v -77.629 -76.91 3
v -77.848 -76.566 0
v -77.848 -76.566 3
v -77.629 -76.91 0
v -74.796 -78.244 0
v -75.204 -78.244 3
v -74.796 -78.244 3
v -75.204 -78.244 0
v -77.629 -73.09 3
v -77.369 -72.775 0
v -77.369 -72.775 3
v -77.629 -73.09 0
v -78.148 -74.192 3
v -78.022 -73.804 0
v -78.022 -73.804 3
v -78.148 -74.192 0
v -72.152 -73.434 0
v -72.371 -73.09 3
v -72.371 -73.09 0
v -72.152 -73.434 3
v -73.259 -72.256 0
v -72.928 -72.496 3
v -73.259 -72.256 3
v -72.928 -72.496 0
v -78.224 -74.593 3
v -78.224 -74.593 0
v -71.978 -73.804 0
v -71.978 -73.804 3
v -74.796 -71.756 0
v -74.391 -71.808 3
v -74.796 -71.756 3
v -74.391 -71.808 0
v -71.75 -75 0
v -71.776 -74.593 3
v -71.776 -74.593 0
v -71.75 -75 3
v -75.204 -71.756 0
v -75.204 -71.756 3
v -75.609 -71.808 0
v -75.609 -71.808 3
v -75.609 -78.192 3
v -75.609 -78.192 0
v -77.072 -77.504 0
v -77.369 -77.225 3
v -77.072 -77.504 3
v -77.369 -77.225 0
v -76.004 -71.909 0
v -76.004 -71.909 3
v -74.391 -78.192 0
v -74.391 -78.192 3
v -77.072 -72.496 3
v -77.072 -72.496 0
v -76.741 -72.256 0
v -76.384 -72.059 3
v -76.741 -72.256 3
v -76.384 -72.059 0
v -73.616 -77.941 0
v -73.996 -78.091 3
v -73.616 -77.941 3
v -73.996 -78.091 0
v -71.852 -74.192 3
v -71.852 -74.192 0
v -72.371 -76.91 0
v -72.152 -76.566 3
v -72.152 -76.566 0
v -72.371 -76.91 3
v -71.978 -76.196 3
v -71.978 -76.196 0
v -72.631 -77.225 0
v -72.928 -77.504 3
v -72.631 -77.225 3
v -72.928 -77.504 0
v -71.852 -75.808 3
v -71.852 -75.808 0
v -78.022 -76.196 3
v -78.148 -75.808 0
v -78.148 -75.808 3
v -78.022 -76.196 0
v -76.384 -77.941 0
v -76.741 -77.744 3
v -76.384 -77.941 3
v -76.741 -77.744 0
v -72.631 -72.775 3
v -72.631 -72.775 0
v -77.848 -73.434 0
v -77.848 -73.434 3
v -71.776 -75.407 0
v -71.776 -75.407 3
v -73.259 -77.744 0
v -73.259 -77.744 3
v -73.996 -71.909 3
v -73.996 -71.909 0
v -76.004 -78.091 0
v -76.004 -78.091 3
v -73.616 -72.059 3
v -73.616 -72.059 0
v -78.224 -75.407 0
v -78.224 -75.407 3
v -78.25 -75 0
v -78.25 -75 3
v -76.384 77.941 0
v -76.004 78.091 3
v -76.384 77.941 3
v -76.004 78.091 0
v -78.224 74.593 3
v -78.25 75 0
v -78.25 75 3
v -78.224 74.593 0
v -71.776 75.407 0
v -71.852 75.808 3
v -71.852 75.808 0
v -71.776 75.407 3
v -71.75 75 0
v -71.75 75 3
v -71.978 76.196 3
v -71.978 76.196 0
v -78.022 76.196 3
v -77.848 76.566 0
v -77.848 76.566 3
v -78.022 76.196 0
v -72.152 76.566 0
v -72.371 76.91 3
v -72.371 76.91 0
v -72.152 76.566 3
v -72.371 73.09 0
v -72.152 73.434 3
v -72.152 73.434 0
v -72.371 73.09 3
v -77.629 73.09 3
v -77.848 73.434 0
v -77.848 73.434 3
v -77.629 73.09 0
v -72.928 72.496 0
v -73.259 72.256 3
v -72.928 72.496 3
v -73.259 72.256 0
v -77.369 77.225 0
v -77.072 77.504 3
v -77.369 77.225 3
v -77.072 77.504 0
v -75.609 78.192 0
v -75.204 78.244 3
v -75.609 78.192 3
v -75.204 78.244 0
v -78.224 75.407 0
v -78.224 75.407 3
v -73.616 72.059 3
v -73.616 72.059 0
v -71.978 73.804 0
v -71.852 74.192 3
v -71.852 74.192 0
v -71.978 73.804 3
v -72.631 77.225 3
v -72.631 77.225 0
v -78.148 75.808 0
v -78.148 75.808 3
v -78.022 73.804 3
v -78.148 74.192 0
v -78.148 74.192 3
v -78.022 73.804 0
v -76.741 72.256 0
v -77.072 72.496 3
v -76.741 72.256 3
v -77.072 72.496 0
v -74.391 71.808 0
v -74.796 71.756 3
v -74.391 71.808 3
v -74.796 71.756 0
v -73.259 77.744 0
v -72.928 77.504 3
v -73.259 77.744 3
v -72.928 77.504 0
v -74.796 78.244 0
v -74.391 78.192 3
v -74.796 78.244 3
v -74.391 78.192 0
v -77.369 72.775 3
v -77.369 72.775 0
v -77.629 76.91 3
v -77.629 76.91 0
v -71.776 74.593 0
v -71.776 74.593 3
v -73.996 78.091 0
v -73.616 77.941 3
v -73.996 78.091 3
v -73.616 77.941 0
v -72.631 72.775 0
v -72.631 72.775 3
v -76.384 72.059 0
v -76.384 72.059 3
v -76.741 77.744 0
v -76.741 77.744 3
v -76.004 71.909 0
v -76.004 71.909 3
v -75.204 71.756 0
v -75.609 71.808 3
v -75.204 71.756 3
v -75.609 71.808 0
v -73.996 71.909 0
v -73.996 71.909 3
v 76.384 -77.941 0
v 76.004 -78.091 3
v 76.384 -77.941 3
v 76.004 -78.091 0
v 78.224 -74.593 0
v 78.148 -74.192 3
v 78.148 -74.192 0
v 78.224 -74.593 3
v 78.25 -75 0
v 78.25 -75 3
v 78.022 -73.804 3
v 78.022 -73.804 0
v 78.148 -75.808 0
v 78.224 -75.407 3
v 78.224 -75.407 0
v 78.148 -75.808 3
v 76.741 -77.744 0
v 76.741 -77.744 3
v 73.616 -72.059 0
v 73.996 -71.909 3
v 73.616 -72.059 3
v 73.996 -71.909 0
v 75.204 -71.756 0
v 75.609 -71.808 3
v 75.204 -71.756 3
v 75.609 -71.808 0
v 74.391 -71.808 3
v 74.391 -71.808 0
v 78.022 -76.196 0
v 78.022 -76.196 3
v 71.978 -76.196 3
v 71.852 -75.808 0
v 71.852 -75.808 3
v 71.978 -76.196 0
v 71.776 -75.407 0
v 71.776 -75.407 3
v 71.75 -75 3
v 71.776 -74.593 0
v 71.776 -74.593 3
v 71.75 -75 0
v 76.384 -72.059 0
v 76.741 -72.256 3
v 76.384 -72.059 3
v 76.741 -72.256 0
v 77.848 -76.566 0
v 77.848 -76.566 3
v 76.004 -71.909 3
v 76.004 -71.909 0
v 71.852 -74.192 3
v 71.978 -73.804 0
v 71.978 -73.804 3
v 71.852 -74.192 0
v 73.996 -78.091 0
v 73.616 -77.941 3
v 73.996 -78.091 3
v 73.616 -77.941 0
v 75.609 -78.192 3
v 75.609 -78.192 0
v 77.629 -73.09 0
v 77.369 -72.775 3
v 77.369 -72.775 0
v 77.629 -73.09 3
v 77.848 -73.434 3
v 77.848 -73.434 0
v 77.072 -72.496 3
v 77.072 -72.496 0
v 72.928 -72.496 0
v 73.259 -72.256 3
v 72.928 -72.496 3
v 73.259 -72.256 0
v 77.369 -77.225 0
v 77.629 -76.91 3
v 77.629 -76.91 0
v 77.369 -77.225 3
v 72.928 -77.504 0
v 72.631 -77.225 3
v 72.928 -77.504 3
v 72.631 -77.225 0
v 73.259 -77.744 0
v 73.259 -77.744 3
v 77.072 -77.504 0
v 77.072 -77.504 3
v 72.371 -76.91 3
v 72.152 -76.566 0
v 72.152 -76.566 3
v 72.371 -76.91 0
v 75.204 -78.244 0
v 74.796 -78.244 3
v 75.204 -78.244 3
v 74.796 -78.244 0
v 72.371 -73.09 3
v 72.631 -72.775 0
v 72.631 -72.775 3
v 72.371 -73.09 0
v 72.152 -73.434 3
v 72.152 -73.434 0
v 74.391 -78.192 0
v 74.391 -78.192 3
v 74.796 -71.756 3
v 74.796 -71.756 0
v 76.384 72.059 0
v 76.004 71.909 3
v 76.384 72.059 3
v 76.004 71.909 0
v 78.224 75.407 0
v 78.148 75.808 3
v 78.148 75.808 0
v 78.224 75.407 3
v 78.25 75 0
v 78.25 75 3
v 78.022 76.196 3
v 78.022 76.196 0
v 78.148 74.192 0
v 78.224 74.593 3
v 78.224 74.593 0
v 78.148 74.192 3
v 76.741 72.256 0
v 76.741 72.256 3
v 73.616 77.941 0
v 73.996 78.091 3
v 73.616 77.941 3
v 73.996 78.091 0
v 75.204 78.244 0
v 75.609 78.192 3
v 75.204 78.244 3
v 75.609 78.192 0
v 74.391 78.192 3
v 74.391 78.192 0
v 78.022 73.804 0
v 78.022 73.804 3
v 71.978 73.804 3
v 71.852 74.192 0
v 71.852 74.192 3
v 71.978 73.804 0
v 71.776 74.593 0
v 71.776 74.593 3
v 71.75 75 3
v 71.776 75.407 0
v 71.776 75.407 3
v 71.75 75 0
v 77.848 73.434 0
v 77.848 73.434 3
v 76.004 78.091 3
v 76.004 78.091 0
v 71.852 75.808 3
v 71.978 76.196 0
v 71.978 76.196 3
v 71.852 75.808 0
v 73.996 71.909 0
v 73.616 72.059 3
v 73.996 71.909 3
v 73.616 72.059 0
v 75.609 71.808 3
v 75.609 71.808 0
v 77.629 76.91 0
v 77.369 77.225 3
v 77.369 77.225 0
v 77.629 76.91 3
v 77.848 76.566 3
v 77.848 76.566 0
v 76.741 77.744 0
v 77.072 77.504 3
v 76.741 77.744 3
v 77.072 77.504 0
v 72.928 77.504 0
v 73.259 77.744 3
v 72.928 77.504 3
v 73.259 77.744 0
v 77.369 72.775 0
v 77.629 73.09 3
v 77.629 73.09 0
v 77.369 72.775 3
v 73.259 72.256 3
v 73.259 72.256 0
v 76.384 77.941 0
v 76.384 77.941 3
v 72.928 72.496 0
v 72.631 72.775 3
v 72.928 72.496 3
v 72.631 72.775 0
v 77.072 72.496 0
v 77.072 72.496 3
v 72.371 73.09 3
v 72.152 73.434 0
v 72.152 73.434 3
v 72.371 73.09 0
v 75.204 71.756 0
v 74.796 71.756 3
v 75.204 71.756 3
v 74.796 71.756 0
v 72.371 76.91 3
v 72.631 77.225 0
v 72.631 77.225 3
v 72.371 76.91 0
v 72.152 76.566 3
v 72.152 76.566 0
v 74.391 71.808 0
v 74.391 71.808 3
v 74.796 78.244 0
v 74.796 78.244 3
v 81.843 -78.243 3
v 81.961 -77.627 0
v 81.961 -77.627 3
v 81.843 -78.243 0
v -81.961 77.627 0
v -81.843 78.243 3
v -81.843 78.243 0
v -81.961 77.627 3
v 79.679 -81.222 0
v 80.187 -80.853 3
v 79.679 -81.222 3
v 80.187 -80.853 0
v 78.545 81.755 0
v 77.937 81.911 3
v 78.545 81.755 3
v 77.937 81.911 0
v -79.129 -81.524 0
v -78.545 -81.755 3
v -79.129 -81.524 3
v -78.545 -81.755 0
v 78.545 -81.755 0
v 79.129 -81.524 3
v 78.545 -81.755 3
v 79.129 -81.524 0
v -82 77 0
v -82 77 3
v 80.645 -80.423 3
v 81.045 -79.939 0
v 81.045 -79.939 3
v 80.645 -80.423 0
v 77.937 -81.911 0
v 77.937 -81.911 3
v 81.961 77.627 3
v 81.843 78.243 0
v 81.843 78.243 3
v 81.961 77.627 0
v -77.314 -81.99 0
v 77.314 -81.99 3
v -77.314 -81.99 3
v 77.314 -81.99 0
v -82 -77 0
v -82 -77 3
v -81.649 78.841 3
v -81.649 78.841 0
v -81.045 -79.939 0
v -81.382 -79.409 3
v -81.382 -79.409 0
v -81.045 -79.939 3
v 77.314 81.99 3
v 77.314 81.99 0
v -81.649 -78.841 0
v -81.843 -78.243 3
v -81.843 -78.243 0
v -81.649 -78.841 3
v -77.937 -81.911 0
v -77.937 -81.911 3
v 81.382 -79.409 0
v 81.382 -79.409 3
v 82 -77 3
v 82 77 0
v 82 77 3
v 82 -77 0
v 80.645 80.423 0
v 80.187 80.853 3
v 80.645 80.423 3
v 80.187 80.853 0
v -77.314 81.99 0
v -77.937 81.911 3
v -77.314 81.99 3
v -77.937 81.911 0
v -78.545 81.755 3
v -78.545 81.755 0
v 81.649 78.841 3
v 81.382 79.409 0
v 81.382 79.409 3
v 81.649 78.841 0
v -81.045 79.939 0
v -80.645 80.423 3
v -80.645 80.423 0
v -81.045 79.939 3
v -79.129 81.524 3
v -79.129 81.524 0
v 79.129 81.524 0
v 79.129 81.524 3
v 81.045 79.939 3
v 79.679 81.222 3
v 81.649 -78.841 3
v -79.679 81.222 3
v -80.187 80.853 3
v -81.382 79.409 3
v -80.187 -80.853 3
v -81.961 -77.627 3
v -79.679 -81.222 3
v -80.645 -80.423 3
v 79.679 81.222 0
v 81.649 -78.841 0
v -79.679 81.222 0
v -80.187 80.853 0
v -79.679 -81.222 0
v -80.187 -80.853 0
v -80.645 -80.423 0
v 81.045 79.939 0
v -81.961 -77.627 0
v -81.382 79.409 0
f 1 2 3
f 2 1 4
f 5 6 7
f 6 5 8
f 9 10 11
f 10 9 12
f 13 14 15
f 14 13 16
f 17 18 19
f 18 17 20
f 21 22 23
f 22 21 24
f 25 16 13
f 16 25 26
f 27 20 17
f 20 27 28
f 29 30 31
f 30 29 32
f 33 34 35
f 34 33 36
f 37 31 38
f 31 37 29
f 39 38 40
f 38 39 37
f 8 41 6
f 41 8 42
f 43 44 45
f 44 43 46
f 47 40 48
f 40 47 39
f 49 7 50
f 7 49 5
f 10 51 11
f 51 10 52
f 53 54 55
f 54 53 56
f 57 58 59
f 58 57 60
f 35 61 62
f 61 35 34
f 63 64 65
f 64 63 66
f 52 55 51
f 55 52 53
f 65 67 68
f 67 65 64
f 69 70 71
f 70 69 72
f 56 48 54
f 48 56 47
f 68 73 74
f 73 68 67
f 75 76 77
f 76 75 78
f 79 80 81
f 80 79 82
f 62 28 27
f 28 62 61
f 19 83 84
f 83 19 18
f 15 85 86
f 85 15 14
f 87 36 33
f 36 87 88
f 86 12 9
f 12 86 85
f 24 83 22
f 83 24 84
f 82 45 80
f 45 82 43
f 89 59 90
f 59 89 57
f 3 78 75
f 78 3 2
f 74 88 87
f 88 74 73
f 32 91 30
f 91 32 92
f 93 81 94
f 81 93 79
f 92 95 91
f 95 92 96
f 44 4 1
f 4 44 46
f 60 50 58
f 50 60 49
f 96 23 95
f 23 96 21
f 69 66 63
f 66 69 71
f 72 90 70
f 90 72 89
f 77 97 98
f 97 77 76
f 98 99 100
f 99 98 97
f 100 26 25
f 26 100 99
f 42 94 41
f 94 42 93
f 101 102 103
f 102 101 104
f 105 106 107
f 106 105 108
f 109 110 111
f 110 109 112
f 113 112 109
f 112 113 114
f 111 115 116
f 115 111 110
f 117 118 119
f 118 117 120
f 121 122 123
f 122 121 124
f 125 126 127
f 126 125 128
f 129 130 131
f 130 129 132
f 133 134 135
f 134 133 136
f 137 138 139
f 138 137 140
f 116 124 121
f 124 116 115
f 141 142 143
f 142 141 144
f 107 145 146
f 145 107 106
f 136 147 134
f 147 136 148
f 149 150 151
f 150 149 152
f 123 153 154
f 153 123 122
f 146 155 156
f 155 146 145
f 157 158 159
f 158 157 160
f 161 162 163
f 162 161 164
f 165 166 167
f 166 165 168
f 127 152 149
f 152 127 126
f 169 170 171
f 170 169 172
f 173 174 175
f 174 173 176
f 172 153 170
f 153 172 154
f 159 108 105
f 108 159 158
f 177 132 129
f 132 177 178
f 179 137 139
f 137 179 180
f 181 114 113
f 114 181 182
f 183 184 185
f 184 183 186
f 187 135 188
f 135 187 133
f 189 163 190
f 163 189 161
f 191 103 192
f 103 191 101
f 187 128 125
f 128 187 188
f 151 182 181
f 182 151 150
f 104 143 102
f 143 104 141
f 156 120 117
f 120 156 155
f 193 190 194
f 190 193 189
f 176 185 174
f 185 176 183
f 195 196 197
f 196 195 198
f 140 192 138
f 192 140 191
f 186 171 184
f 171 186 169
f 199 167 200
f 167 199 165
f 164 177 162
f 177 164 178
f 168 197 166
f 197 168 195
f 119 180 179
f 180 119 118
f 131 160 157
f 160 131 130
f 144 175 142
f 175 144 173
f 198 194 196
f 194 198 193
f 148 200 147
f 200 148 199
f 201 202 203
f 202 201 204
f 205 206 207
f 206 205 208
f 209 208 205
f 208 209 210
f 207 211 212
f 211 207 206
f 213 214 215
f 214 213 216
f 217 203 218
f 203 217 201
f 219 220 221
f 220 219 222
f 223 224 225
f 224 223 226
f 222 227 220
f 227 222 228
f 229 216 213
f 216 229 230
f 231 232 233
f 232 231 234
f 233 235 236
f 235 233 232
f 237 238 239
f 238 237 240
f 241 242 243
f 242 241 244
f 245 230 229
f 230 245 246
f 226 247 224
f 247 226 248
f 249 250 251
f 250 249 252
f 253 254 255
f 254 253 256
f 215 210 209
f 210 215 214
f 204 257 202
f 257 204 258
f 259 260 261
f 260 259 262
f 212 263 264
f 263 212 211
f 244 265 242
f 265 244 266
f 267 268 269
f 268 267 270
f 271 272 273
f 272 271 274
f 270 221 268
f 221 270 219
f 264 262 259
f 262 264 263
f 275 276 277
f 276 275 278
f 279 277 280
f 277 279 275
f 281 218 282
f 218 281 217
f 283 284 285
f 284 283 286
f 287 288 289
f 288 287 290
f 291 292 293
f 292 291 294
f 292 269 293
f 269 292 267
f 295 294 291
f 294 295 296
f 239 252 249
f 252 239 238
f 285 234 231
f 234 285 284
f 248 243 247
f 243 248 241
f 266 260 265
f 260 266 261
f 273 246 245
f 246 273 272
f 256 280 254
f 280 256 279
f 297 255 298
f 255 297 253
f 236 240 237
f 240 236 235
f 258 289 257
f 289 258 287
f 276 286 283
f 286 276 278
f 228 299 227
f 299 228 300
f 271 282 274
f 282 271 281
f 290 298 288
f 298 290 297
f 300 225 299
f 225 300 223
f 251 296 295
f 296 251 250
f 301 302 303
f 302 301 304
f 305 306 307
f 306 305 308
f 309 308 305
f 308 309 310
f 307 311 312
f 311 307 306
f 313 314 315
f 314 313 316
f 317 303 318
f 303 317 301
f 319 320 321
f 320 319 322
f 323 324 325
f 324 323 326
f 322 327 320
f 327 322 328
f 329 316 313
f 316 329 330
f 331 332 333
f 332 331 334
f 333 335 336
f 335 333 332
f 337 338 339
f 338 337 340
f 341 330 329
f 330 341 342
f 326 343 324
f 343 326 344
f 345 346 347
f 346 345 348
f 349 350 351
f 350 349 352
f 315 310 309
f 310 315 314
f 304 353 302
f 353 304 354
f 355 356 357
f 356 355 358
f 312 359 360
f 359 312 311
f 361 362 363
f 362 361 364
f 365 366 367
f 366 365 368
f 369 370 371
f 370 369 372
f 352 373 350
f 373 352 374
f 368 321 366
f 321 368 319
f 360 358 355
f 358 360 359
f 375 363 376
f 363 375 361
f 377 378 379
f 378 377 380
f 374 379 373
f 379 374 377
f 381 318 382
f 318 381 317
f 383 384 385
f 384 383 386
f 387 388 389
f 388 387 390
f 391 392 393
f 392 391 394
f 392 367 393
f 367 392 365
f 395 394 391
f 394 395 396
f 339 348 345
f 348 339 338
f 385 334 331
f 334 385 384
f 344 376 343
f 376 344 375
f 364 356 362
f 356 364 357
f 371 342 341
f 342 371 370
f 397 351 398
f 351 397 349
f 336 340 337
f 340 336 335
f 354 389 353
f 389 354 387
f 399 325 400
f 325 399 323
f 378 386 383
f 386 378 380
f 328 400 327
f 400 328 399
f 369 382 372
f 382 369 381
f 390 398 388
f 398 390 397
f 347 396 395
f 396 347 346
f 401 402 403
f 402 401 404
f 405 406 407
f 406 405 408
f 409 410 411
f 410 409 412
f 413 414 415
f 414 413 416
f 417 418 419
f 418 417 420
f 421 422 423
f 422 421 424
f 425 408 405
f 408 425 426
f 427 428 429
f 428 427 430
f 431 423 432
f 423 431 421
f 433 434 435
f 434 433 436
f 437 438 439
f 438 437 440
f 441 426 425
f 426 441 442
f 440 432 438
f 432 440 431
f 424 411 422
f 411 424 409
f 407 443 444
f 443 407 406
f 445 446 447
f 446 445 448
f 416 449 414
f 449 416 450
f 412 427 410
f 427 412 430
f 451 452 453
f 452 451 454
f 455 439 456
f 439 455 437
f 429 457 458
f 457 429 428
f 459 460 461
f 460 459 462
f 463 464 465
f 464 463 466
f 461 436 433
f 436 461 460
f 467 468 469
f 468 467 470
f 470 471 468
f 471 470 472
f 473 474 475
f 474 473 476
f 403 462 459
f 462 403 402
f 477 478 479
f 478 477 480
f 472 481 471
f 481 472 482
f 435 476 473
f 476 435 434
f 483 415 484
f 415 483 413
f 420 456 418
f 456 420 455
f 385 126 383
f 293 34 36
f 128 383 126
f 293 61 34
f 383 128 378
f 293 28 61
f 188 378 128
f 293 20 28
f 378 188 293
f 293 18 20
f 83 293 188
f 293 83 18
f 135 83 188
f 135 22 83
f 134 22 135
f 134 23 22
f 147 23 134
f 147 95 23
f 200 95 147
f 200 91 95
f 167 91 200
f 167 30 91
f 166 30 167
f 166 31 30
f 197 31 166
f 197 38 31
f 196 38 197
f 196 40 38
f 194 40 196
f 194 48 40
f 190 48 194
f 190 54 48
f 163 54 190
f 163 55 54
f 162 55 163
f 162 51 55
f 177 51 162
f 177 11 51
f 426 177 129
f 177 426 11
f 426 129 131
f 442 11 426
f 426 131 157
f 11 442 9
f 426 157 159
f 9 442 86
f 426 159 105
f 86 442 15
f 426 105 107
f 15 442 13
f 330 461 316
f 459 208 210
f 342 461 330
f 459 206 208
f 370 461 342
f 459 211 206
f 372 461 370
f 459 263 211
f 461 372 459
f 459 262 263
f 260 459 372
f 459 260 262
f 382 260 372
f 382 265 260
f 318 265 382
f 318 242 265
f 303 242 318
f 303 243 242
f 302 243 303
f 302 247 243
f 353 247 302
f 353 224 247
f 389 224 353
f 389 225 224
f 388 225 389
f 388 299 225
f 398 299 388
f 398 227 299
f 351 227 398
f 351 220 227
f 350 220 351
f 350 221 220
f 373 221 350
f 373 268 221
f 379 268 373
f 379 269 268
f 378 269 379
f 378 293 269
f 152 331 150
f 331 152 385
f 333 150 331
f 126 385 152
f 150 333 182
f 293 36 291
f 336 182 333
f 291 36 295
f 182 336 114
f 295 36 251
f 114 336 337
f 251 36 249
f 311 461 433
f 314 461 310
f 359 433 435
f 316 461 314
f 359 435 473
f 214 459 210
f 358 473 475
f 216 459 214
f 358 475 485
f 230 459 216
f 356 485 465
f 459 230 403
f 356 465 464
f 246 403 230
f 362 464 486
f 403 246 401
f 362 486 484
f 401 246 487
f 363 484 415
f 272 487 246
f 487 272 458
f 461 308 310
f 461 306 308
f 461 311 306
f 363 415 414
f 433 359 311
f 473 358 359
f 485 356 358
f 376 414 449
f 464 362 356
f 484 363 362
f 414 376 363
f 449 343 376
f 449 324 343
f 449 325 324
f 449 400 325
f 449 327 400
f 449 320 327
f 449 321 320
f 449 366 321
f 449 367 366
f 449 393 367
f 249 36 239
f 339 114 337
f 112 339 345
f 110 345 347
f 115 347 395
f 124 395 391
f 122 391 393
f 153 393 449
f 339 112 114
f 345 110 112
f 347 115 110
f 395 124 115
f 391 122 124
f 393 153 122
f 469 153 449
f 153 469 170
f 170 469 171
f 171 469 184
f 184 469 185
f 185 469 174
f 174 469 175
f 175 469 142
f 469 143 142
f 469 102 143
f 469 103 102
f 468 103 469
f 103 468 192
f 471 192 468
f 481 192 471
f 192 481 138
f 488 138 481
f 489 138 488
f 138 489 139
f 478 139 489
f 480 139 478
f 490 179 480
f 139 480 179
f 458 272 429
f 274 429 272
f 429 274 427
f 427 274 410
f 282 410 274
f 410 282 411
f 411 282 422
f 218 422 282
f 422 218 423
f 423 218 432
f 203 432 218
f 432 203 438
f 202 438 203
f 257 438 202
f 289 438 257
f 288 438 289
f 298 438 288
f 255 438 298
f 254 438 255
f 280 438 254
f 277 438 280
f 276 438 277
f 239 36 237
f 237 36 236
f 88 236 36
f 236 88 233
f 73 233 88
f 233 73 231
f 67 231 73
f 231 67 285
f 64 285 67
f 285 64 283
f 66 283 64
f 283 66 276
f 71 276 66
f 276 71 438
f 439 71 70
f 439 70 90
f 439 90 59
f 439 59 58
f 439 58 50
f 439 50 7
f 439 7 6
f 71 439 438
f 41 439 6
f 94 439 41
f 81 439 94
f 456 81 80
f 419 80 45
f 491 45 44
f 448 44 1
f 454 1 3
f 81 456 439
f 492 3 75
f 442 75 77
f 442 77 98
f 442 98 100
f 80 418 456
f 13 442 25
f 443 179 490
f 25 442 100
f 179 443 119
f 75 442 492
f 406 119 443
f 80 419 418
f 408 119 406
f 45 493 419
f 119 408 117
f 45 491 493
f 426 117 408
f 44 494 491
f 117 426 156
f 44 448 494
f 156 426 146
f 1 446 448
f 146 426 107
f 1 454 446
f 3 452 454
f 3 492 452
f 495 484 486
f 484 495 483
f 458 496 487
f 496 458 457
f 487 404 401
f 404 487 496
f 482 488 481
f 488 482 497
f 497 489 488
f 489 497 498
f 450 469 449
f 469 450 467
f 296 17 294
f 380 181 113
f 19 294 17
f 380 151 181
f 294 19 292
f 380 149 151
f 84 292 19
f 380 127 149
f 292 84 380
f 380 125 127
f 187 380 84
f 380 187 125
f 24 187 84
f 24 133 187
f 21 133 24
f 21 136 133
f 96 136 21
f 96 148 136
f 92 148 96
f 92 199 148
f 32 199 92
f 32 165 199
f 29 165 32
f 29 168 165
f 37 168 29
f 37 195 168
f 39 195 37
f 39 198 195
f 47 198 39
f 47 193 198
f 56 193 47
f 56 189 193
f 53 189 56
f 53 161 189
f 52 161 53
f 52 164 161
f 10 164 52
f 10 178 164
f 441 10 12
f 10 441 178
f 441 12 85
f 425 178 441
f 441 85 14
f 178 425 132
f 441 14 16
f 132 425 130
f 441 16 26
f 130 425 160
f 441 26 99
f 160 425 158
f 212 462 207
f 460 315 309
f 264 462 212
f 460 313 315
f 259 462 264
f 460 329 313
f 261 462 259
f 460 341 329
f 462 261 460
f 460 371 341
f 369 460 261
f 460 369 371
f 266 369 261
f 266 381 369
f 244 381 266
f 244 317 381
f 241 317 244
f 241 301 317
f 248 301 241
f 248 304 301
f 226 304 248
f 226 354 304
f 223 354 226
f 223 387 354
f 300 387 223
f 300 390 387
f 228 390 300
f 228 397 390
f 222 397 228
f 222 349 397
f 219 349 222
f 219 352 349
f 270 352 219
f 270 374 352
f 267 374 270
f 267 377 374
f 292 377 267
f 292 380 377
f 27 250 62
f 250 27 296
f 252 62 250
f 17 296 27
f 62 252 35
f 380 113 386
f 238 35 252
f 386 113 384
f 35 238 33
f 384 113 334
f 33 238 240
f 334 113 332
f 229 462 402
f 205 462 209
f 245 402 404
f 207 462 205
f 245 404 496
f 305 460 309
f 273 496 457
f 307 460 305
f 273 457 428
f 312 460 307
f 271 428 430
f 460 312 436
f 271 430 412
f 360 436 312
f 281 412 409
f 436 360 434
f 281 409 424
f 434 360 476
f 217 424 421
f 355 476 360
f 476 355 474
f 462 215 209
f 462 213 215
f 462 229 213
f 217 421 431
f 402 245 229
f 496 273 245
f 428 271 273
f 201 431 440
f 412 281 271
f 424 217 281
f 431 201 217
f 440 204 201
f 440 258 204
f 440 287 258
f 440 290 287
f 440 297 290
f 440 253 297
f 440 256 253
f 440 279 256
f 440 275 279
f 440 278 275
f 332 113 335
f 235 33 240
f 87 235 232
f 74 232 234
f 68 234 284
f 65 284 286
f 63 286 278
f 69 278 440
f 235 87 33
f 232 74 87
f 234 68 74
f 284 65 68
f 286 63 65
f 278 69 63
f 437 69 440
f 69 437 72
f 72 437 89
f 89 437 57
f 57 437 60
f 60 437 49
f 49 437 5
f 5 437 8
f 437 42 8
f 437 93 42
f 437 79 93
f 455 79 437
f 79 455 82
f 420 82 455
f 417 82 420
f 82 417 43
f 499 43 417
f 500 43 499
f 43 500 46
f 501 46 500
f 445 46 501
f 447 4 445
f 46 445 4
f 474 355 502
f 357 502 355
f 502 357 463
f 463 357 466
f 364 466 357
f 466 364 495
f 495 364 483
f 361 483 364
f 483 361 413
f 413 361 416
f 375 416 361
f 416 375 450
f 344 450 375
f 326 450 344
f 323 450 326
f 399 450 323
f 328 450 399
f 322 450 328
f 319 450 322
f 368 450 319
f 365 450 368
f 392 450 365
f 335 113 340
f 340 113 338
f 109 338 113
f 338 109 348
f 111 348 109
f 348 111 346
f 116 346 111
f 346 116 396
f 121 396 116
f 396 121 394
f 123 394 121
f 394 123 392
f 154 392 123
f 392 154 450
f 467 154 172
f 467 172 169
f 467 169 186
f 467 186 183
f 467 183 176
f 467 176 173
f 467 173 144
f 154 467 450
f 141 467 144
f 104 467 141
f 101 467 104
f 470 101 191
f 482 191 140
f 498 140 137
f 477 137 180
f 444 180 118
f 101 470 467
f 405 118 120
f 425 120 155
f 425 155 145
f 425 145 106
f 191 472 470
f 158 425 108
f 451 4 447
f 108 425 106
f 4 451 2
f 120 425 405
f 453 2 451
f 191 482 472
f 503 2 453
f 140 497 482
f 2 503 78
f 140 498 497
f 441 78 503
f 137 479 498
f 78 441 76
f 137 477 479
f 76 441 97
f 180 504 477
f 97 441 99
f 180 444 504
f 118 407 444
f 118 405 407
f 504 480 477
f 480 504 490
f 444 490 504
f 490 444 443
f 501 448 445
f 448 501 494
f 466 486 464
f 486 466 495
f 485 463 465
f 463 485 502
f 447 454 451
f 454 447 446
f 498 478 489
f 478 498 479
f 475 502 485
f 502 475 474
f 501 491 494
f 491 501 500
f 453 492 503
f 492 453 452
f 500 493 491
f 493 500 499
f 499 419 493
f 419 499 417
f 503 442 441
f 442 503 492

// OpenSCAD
$fn = 50;


difference() {
	union() {
		hull() {
			translate(v = [-77.0000000000, 77.0000000000, 0]) {
				cylinder(h = 3, r = 5);
			}
			translate(v = [77.0000000000, 77.0000000000, 0]) {
				cylinder(h = 3, r = 5);
			}
			translate(v = [-77.0000000000, -77.0000000000, 0]) {
				cylinder(h = 3, r = 5);
			}
			translate(v = [77.0000000000, -77.0000000000, 0]) {
				cylinder(h = 3, r = 5);
			}
		}
	}
	union() {
		translate(v = [-75.0000000000, -75.0000000000, -100.0000000000]) {
			cylinder(h = 200, r = 3.2500000000);
		}
		translate(v = [-75.0000000000, 75.0000000000, -100.0000000000]) {
			cylinder(h = 200, r = 3.2500000000);
		}
		translate(v = [75.0000000000, -75.0000000000, -100.0000000000]) {
			cylinder(h = 200, r = 3.2500000000);
		}
		translate(v = [75.0000000000, 75.0000000000, -100.0000000000]) {
			cylinder(h = 200, r = 3.2500000000);
		}
	}
}
